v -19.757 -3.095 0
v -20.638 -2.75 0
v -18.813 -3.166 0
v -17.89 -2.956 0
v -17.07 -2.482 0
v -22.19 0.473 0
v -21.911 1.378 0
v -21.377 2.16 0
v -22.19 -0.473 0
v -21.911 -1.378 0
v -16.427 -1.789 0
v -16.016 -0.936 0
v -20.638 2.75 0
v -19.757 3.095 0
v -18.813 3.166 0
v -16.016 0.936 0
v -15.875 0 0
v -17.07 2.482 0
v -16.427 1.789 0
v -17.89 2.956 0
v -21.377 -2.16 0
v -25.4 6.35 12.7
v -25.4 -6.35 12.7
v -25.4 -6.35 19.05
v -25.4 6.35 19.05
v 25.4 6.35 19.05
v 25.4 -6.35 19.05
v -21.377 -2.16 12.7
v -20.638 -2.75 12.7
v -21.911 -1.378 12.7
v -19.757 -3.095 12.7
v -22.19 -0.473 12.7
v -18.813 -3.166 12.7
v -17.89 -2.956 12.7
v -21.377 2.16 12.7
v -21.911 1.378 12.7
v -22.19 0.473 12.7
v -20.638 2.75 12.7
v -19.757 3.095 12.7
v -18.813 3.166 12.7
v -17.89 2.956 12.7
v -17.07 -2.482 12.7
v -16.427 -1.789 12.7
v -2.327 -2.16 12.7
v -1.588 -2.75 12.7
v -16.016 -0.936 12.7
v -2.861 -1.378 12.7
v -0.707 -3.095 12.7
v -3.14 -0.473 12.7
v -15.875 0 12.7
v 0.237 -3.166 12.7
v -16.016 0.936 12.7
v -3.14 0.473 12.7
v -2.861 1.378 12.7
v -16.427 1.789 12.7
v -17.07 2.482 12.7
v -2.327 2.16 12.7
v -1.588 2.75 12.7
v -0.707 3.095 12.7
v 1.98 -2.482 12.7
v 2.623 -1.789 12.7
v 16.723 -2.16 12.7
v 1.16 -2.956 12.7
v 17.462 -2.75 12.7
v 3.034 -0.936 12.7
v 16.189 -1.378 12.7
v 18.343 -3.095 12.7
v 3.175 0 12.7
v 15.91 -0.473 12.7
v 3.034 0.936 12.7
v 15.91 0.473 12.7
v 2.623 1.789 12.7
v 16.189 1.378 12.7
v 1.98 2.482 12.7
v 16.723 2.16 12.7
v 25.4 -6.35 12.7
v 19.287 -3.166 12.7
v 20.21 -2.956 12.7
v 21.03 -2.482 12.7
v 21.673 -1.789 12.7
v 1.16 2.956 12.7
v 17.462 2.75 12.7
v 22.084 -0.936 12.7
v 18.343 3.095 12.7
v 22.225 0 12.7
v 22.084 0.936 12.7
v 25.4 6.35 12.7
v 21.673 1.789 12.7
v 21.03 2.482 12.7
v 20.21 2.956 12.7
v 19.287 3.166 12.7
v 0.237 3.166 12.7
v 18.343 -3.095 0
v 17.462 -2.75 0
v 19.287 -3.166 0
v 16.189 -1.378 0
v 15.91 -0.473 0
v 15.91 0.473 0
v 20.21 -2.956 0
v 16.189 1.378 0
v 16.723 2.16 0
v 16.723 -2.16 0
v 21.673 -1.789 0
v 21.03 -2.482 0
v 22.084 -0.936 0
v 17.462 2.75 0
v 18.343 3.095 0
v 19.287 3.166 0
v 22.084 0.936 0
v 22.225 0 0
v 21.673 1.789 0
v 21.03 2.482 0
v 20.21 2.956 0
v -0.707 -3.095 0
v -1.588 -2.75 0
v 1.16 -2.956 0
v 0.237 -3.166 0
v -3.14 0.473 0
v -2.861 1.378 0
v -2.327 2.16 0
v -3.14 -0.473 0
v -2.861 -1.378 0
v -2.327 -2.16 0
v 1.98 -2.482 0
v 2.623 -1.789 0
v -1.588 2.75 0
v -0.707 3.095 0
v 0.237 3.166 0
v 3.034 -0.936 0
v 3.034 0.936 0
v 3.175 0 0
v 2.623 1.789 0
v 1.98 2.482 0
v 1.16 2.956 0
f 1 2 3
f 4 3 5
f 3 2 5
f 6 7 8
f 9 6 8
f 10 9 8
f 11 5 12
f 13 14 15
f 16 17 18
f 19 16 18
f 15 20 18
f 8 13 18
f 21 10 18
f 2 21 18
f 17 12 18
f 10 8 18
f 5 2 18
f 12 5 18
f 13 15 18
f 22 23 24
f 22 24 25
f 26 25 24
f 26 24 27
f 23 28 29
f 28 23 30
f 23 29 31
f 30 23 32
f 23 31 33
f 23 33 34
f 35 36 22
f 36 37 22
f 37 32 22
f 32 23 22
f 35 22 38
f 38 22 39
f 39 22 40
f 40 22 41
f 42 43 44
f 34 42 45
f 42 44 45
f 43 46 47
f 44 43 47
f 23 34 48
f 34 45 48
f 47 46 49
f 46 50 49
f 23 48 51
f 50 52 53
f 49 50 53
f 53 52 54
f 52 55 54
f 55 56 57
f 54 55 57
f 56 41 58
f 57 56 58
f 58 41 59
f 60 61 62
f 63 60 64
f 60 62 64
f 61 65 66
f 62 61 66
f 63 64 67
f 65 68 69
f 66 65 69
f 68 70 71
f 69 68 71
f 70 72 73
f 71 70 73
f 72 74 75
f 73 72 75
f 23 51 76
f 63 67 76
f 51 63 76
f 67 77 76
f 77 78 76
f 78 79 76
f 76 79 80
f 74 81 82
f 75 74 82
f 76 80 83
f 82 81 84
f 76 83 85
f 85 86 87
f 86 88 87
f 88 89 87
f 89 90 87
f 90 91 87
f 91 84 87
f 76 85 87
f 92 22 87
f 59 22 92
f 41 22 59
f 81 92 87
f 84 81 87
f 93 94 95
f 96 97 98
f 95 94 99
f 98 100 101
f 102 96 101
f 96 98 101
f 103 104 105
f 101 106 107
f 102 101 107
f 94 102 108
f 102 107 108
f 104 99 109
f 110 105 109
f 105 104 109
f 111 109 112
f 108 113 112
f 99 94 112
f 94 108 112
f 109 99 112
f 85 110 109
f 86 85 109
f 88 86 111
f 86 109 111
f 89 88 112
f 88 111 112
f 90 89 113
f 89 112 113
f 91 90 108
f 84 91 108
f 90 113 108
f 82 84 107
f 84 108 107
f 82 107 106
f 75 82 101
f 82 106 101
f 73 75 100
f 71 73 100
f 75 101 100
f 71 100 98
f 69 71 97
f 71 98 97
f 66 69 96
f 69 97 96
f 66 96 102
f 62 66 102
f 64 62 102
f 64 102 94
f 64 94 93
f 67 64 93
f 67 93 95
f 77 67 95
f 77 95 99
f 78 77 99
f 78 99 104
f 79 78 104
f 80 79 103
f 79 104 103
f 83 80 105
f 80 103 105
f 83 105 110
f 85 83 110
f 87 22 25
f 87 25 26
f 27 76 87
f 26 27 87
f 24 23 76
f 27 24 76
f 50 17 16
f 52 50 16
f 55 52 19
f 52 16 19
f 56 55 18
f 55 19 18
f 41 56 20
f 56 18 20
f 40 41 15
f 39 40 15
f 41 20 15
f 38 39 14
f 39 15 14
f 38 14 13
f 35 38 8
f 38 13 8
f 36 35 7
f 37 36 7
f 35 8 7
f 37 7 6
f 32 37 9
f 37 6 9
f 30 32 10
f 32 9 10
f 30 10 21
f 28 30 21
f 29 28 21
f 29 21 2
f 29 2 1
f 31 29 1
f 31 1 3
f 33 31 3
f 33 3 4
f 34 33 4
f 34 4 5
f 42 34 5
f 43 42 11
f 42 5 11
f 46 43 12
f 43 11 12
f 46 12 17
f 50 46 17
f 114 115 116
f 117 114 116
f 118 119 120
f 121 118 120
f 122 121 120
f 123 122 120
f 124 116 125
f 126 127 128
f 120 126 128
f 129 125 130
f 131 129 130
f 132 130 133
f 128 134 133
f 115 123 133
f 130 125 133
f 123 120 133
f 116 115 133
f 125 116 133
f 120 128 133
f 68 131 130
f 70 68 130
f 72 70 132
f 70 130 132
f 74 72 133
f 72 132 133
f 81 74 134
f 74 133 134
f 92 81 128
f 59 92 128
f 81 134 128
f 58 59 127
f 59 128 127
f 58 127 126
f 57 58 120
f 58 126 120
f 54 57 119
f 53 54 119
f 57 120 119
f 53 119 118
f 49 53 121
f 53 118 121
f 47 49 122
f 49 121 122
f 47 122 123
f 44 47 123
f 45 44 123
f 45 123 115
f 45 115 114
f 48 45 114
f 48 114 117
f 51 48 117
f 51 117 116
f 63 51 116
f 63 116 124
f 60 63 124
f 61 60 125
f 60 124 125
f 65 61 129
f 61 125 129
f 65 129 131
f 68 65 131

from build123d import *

# Parameters (mm, degrees)
SKETCH1_R             = 3.175
BOSS_EXTRUDE1_DEPTH   = 12.7
BOSS_EXTRUDE1_2_DEPTH = 12.7
BOSS_EXTRUDE1_3_DEPTH = 12.7
SKETCH2_W             = 50.8
SKETCH2_H             = 12.7
BOSS_EXTRUDE2_DEPTH   = 6.35


with BuildPart() as part:
    # Sketch1 → Boss-Extrude1 (new body)
    with BuildSketch(Plane.XY):
        Circle(SKETCH1_R)
    extrude(amount=BOSS_EXTRUDE1_DEPTH)



with BuildPart() as body_2:
    # Sketch1 → Boss-Extrude1 2 (new body)
    with BuildSketch(Plane.XY):
        with Locations((19.05, 0)):
            Circle(SKETCH1_R)
    extrude(amount=BOSS_EXTRUDE1_2_DEPTH)


with BuildPart() as body_3:
    # Sketch1 → Boss-Extrude1 3 (new body)
    with BuildSketch(Plane.XY):
        with Locations((-19.05, 0)):
            Circle(SKETCH1_R)
    extrude(amount=BOSS_EXTRUDE1_3_DEPTH)


with BuildPart() as part_1:
    add(part.part)

    add(body_2.part)  # Boss-Extrude2 merges body 2

    add(body_3.part)  # Boss-Extrude2 merges body 3
    # Sketch2 → Boss-Extrude2 (add)
    with BuildSketch(Plane.XY.offset(12.7)):
        Rectangle(SKETCH2_W, SKETCH2_H)
    extrude(amount=BOSS_EXTRUDE2_DEPTH)


solid = part_1.part
